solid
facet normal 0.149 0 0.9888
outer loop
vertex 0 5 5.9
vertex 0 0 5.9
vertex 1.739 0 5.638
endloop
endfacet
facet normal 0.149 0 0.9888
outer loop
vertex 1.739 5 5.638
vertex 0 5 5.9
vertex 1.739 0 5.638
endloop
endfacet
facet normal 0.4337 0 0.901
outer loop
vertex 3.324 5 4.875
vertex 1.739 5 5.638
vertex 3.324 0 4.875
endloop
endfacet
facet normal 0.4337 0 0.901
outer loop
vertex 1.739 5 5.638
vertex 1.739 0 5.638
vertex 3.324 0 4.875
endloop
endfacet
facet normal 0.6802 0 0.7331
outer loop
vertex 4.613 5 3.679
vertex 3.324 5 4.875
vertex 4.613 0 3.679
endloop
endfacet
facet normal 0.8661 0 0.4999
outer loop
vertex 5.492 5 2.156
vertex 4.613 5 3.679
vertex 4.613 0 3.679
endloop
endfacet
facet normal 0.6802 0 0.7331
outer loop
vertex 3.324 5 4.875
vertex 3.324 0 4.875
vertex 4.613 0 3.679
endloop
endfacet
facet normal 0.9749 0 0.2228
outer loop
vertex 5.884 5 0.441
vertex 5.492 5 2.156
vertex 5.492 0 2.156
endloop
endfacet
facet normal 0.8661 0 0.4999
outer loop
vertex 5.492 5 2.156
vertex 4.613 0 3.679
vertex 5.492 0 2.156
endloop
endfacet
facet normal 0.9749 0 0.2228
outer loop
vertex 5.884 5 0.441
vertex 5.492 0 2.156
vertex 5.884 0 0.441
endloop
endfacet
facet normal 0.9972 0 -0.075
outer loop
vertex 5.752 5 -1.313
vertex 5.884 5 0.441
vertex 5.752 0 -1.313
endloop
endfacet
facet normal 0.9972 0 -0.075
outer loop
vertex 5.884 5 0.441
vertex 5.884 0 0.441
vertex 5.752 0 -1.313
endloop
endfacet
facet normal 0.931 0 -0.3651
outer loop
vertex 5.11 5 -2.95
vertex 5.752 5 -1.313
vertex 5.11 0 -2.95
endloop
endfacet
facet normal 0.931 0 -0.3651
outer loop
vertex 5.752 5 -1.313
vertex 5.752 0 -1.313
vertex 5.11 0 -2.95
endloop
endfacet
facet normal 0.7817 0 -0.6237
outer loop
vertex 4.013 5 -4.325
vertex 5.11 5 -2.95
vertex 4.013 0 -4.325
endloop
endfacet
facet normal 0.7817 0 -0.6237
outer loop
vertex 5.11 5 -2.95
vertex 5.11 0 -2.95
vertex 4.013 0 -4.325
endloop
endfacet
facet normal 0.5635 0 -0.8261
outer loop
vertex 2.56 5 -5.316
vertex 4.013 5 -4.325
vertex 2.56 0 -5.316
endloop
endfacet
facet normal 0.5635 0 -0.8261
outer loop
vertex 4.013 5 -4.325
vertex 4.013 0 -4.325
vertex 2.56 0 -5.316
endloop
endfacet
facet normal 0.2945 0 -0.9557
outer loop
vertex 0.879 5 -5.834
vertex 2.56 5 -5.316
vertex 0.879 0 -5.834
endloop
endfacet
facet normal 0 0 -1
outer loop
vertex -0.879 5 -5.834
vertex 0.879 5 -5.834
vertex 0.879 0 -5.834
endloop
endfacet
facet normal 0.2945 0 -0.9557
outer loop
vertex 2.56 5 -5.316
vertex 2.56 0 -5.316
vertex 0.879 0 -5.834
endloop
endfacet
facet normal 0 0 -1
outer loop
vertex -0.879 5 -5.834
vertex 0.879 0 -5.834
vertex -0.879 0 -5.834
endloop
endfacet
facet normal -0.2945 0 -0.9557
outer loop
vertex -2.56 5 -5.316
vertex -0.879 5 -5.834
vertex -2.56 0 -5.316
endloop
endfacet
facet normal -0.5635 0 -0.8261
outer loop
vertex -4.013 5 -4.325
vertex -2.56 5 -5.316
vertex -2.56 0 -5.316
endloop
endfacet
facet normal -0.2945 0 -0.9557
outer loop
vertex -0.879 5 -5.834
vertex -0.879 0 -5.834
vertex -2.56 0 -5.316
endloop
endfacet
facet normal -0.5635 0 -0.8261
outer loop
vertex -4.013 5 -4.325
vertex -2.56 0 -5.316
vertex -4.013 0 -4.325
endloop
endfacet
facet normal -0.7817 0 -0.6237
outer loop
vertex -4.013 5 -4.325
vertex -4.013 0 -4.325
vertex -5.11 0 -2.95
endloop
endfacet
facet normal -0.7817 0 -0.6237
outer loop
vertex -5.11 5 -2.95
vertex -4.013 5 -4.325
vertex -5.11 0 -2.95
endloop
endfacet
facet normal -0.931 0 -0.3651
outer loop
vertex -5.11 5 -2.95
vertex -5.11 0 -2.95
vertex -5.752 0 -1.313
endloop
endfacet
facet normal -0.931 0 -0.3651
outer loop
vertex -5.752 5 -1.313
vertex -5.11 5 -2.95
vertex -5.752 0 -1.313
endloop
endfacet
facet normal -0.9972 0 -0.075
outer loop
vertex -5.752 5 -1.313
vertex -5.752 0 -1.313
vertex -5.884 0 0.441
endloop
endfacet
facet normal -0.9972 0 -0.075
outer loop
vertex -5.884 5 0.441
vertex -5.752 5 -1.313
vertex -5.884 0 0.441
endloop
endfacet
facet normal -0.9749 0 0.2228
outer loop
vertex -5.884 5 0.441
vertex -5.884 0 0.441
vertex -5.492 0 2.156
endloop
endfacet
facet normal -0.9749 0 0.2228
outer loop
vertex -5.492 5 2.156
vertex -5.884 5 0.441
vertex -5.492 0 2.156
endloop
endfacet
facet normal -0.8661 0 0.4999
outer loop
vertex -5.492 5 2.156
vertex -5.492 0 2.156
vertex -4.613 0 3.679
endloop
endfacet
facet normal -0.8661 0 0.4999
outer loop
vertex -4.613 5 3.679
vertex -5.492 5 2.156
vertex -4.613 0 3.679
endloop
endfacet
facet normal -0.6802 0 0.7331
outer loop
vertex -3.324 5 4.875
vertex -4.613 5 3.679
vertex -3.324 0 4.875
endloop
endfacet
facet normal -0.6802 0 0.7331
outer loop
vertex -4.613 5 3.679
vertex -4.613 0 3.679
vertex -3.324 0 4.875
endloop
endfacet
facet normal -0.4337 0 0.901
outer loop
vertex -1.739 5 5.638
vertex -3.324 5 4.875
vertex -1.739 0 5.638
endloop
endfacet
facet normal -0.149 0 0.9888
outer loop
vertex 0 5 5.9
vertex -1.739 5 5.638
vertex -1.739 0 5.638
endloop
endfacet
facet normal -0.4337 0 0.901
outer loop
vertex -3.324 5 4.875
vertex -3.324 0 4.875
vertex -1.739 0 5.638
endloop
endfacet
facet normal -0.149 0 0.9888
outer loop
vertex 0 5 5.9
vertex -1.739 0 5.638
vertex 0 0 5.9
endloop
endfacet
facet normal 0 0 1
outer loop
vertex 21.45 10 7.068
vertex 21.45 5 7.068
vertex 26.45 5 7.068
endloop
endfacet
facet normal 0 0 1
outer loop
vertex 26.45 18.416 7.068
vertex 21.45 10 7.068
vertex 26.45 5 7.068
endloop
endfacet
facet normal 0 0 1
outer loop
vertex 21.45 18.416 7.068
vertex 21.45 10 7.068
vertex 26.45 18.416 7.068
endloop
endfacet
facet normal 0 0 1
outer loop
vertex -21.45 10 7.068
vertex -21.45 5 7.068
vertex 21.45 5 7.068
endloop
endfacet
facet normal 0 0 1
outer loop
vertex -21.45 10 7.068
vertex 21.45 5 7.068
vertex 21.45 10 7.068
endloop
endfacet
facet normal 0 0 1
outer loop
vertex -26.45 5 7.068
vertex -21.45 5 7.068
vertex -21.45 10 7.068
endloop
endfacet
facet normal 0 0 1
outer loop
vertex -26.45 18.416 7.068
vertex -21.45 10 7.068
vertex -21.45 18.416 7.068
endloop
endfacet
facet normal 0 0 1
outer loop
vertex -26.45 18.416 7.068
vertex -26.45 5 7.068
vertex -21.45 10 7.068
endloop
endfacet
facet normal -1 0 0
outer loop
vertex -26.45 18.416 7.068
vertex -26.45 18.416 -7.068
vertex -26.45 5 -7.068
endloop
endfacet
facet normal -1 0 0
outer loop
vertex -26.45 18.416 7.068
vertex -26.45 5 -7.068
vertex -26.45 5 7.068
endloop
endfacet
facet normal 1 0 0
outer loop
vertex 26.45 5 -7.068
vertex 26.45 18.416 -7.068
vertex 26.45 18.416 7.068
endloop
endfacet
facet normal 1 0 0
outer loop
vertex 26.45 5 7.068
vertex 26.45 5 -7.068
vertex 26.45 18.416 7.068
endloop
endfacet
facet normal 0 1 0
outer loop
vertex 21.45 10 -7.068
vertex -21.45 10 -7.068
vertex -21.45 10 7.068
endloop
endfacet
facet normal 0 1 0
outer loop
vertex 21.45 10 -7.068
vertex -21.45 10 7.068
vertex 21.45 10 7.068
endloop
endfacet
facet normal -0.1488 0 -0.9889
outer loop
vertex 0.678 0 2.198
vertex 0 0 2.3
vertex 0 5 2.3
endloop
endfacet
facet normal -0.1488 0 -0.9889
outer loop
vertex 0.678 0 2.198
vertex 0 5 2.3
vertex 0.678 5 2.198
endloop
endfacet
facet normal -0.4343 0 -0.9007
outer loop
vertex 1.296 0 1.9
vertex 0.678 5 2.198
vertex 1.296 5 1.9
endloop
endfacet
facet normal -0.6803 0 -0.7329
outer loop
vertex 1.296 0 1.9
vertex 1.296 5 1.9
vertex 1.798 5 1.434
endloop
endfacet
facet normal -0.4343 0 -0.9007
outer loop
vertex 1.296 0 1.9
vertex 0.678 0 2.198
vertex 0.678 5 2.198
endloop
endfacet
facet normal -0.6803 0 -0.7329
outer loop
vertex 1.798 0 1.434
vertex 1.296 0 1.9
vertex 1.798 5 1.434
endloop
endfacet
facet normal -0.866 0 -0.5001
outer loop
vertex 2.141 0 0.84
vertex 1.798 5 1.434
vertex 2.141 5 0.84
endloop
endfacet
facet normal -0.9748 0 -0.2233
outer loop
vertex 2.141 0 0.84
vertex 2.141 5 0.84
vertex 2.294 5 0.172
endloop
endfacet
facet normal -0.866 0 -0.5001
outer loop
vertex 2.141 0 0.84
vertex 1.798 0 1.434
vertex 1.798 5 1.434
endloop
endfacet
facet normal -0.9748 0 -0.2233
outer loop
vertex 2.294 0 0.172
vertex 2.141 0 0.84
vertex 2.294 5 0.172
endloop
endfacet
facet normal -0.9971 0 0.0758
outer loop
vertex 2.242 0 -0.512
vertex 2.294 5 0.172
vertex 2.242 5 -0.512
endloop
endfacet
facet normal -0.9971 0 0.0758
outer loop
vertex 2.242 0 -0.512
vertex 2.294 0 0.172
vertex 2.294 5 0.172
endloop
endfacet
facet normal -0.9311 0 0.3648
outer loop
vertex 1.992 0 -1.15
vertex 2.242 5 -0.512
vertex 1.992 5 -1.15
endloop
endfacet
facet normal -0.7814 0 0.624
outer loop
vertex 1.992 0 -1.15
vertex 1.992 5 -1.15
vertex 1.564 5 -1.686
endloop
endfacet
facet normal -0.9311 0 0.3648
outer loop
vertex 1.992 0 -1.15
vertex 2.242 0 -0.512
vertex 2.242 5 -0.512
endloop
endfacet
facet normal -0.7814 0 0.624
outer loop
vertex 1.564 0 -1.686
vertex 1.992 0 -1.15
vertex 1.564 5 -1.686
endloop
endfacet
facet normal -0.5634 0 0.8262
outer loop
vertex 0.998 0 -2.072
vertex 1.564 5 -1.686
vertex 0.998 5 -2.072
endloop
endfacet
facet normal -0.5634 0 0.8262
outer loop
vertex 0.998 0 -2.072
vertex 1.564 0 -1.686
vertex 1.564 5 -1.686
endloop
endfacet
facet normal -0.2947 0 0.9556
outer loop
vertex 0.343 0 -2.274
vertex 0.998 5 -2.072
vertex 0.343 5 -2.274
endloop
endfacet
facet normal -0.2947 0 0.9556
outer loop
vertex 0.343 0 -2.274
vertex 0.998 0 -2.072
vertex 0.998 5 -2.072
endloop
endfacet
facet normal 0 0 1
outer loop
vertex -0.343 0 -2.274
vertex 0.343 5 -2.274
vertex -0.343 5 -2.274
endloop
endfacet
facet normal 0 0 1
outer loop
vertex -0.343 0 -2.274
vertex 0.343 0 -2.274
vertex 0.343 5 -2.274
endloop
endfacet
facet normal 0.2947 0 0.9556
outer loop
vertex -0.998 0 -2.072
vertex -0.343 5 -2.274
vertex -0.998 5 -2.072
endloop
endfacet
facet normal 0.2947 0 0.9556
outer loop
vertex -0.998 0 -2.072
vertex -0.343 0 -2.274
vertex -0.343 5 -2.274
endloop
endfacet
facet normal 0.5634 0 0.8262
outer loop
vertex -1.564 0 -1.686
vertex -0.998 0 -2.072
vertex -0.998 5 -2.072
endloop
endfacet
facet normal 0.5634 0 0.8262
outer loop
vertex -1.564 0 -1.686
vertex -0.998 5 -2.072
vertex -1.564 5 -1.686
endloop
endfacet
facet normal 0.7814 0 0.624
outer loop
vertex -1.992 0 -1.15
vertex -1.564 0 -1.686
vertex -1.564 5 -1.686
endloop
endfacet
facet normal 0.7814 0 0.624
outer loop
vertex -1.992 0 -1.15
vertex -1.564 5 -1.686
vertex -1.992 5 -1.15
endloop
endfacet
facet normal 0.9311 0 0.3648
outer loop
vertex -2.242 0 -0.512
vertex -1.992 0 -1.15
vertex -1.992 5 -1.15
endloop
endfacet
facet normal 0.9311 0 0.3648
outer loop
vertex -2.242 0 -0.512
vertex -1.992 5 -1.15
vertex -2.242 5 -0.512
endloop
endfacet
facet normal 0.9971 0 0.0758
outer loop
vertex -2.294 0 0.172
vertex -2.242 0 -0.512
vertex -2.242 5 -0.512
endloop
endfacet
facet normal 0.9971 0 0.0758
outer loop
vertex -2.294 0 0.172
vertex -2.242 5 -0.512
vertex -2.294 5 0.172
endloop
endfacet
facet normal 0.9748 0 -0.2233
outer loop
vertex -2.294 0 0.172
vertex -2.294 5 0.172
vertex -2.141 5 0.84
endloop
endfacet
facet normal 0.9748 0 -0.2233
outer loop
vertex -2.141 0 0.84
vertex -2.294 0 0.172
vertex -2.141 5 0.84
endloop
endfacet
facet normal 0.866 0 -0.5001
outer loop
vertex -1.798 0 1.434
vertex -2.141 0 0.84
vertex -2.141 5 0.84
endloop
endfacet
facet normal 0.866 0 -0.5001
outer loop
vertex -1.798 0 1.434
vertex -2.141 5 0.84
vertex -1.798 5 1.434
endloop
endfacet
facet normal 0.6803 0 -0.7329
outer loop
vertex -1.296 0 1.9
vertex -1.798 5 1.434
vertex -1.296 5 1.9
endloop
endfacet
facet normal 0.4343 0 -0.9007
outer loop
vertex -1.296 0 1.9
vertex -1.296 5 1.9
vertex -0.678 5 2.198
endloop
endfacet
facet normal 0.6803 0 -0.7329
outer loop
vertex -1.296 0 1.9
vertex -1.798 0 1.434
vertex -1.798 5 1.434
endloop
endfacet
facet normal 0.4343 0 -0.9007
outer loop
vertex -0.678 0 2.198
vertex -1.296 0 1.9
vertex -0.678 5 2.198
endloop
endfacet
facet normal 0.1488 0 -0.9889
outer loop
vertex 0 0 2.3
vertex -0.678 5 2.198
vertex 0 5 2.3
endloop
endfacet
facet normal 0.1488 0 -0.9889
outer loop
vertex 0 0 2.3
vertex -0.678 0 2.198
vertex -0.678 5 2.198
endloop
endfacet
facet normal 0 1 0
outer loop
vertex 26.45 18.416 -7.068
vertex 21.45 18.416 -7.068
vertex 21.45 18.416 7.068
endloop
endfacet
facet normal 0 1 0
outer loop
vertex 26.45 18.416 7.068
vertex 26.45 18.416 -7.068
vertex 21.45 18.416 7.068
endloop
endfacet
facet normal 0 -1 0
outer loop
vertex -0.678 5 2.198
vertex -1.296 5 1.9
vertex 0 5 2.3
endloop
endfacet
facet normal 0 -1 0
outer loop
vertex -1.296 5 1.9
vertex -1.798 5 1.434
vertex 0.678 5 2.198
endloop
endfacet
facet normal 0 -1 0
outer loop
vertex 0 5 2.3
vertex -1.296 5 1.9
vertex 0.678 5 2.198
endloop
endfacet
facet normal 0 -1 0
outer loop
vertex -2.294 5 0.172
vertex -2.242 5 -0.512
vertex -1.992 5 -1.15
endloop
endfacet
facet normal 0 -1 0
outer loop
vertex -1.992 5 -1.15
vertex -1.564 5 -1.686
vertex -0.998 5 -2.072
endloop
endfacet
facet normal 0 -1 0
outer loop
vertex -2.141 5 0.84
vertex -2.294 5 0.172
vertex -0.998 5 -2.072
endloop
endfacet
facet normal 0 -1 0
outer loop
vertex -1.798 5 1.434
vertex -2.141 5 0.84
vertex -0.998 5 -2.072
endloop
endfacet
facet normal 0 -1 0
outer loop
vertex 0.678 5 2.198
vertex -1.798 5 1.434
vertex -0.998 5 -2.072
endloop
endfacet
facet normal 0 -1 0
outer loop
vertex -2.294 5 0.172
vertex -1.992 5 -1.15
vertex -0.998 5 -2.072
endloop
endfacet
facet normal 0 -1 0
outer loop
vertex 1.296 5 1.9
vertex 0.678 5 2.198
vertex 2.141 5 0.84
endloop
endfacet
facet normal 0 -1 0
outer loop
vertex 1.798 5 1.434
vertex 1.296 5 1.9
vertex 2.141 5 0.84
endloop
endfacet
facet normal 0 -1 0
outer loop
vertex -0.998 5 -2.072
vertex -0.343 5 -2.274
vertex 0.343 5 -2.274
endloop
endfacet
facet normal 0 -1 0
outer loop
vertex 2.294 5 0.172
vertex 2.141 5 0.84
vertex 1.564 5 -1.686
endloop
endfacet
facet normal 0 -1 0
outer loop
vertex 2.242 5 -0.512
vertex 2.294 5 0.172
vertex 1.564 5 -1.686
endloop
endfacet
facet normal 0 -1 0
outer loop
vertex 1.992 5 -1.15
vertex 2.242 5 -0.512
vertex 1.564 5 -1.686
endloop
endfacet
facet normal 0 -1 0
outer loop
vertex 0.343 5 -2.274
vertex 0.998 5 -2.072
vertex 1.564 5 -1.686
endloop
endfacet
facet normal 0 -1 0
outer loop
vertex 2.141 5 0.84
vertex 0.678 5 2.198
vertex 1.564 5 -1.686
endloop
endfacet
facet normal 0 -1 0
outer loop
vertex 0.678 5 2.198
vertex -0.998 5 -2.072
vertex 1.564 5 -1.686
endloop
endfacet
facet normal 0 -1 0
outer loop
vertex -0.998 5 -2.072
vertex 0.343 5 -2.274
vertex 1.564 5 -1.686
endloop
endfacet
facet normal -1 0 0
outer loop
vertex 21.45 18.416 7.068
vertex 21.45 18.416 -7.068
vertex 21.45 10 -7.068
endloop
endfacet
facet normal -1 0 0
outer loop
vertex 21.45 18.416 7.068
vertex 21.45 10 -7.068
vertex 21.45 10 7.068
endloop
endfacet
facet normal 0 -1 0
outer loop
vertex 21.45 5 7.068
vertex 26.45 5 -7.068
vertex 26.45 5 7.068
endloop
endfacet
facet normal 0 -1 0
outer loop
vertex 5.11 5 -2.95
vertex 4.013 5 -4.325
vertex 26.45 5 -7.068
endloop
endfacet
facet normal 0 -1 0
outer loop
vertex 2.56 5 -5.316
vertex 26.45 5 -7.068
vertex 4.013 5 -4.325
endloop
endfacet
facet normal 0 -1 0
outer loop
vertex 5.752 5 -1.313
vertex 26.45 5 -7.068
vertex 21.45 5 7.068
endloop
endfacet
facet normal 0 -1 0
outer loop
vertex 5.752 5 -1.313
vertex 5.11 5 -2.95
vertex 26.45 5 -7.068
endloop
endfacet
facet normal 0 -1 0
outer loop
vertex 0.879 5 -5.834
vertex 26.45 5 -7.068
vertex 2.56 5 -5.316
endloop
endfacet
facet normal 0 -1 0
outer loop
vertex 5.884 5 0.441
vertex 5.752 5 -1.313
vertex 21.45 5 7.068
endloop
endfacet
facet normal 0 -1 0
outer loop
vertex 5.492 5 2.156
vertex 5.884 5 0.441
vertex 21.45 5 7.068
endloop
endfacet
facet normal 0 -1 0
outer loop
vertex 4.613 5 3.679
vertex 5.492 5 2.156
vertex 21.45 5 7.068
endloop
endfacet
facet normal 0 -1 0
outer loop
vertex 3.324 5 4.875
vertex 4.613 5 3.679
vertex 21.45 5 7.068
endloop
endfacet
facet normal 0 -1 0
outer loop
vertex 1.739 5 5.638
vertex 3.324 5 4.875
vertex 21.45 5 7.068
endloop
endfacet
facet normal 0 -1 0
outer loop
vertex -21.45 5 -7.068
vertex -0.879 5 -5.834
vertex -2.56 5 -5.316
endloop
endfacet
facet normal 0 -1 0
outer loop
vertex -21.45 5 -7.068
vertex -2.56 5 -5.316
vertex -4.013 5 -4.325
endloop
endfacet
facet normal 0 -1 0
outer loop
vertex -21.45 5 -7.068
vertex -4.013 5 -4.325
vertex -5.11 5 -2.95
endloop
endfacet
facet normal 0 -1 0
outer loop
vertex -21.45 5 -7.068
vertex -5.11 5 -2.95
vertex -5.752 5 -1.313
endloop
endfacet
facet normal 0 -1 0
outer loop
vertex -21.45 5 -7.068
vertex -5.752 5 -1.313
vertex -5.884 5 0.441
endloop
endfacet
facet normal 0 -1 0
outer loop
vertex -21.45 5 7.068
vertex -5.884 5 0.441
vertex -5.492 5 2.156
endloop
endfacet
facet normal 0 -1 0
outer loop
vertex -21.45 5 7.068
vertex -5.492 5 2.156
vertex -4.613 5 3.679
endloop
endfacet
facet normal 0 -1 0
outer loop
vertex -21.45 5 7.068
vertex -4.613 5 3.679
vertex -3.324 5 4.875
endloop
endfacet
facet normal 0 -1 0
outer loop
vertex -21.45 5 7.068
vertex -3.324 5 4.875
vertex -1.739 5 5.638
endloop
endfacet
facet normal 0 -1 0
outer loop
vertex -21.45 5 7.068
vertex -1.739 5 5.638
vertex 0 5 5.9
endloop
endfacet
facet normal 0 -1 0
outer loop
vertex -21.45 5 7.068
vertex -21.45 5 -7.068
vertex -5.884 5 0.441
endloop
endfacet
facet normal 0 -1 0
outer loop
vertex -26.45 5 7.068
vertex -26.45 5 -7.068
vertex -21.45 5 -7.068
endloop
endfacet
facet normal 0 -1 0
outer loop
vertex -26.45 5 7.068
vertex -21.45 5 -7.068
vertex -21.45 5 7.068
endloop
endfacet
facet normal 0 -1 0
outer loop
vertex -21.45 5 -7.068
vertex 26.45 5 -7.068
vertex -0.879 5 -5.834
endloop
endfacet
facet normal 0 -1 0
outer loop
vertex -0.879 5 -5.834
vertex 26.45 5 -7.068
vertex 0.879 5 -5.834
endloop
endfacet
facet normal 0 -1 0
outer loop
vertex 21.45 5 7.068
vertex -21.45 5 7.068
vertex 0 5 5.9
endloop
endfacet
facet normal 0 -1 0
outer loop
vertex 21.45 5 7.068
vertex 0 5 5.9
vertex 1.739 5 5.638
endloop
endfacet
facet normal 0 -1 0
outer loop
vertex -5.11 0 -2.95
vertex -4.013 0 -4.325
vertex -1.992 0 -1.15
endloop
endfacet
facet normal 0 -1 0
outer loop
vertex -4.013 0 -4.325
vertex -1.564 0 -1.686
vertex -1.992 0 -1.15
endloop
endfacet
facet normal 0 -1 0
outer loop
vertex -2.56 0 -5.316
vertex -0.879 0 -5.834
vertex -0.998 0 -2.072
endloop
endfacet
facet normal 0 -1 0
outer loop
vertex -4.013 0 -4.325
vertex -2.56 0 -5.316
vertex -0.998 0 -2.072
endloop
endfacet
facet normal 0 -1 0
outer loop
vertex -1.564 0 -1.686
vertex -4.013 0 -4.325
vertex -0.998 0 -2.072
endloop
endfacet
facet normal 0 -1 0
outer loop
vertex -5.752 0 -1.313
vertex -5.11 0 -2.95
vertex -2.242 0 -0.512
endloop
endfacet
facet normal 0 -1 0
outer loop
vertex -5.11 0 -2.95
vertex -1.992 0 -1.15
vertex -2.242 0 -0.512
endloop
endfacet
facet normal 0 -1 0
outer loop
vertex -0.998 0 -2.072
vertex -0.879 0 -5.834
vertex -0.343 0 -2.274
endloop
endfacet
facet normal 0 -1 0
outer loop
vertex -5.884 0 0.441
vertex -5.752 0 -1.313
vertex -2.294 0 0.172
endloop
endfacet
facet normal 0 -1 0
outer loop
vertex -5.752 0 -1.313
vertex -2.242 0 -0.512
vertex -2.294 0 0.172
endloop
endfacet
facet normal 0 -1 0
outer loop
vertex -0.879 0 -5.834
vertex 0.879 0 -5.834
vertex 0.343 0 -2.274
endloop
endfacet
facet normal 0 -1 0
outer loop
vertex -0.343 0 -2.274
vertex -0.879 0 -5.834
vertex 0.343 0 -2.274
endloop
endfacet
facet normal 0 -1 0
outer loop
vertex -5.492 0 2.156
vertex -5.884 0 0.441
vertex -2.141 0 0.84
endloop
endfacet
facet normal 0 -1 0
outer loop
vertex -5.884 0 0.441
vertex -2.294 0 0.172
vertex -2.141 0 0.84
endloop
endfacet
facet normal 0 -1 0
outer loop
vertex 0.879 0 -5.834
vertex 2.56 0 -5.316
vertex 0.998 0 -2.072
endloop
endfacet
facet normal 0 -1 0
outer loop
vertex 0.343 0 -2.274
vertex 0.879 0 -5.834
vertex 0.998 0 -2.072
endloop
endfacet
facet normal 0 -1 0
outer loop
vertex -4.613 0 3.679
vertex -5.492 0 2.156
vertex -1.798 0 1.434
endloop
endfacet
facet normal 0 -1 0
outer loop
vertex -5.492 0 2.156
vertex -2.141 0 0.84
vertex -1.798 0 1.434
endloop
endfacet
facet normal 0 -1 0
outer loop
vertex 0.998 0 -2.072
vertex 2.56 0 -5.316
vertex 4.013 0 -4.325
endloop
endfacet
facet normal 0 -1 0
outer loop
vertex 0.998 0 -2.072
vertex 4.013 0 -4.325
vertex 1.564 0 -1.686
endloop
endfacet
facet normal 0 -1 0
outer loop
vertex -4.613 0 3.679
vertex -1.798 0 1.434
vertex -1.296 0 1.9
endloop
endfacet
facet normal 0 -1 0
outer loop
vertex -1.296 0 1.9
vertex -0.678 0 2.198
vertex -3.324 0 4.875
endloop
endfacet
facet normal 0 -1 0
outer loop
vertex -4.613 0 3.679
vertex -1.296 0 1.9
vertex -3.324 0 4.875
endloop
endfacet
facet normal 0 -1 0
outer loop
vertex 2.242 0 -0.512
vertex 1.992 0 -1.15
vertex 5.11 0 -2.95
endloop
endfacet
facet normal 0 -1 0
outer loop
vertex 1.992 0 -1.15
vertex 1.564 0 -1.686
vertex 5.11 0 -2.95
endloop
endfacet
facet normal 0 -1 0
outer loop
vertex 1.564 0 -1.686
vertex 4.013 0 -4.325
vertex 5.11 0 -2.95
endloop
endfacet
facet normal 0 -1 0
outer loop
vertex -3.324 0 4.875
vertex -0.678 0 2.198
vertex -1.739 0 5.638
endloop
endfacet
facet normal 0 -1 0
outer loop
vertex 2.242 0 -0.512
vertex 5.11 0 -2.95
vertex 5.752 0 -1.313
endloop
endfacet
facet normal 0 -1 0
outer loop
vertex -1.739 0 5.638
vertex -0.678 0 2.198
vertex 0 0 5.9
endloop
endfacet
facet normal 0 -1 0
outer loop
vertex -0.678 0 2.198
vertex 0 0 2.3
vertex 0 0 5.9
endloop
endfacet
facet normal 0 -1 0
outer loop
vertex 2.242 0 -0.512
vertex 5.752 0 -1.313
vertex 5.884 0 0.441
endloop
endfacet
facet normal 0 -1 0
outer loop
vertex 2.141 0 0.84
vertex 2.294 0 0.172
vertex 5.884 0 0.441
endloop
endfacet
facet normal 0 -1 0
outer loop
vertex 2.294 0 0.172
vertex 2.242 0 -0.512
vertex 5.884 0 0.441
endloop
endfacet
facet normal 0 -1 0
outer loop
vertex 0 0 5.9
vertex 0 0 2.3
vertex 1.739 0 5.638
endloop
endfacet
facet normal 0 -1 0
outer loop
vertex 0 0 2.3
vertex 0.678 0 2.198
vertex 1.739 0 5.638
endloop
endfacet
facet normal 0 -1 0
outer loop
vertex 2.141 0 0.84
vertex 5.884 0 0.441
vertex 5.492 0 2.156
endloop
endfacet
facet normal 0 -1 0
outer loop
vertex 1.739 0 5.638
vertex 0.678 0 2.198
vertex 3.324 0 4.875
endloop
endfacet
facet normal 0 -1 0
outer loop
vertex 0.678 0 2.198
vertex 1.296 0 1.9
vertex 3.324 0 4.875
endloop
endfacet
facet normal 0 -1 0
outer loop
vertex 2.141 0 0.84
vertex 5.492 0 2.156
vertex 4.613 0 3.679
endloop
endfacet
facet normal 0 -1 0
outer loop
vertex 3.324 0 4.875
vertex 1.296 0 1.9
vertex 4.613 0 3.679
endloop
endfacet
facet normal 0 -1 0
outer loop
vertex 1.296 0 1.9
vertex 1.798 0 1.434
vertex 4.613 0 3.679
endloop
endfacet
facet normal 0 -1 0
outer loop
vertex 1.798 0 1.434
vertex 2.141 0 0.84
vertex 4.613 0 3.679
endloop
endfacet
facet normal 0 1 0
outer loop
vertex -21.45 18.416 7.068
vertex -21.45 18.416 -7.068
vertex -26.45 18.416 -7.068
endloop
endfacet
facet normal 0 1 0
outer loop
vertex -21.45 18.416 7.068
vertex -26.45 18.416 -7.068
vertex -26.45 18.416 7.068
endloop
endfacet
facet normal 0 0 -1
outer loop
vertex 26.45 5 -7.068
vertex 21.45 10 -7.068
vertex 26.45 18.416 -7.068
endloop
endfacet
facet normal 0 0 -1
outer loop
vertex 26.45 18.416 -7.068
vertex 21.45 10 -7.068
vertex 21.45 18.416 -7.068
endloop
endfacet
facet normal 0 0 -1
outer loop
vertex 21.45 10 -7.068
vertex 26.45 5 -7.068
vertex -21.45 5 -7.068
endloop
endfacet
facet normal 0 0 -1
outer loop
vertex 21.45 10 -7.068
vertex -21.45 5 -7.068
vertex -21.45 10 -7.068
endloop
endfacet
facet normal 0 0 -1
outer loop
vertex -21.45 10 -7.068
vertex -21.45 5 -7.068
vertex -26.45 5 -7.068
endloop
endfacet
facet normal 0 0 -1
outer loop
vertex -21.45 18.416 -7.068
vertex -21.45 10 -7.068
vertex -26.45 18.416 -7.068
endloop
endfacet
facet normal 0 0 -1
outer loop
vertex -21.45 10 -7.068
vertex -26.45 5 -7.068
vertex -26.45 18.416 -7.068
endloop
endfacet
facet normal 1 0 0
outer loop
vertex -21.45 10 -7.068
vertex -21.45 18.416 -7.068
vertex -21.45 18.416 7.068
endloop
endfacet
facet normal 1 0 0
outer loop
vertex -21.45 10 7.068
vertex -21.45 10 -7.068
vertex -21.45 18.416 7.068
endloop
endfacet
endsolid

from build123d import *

# Parameters (mm, degrees)
SKETCH1_R           = 5.9
SKETCH1_R_2         = 2.3
BOSS_EXTRUDE1_DEPTH = 5
SKETCH2_W           = 42.9
SKETCH2_H           = 14.13586664
BOSS_EXTRUDE2_DEPTH = 5
SKETCH3_W           = 14.13586664
SKETCH3_H           = 13.416162411
BOSS_EXTRUDE3_DEPTH = 5


with BuildPart() as part:
    # Sketch1 → Boss-Extrude1 (new body)
    with BuildSketch(Plane(origin=(0, 0, 0), x_dir=(1, 0, 0), z_dir=(0, 1, 0))):
        with Locations(Location((0, 0, 0), (0, 0, 270))):
            Circle(SKETCH1_R)
        with Locations(Location((0, 0, 0), (0, 0, 270))):
            Circle(SKETCH1_R_2, mode=Mode.SUBTRACT)
    extrude(amount=BOSS_EXTRUDE1_DEPTH)

    # Sketch2 → Boss-Extrude2 (add)
    with BuildSketch(Plane(origin=(0, 5, 0), x_dir=(1, 0, 0), z_dir=(0, 1, 0))):
        Rectangle(SKETCH2_W, SKETCH2_H)
    extrude(amount=BOSS_EXTRUDE2_DEPTH)

    # Sketch3 → Boss-Extrude3 (add)
    with BuildSketch(Plane.ZY.offset(21.45)):
        with Locations((0, 11.708081206)):
            Rectangle(SKETCH3_W, SKETCH3_H)
    boss_extrude3 = extrude(amount=BOSS_EXTRUDE3_DEPTH)

    # Mirror1: Boss-Extrude3 across plane
    add(boss_extrude3.mirror(Plane(origin=(0, 0, 0), x_dir=(0, 0, 1), z_dir=(1, 0, 0))))


solid = part.part
